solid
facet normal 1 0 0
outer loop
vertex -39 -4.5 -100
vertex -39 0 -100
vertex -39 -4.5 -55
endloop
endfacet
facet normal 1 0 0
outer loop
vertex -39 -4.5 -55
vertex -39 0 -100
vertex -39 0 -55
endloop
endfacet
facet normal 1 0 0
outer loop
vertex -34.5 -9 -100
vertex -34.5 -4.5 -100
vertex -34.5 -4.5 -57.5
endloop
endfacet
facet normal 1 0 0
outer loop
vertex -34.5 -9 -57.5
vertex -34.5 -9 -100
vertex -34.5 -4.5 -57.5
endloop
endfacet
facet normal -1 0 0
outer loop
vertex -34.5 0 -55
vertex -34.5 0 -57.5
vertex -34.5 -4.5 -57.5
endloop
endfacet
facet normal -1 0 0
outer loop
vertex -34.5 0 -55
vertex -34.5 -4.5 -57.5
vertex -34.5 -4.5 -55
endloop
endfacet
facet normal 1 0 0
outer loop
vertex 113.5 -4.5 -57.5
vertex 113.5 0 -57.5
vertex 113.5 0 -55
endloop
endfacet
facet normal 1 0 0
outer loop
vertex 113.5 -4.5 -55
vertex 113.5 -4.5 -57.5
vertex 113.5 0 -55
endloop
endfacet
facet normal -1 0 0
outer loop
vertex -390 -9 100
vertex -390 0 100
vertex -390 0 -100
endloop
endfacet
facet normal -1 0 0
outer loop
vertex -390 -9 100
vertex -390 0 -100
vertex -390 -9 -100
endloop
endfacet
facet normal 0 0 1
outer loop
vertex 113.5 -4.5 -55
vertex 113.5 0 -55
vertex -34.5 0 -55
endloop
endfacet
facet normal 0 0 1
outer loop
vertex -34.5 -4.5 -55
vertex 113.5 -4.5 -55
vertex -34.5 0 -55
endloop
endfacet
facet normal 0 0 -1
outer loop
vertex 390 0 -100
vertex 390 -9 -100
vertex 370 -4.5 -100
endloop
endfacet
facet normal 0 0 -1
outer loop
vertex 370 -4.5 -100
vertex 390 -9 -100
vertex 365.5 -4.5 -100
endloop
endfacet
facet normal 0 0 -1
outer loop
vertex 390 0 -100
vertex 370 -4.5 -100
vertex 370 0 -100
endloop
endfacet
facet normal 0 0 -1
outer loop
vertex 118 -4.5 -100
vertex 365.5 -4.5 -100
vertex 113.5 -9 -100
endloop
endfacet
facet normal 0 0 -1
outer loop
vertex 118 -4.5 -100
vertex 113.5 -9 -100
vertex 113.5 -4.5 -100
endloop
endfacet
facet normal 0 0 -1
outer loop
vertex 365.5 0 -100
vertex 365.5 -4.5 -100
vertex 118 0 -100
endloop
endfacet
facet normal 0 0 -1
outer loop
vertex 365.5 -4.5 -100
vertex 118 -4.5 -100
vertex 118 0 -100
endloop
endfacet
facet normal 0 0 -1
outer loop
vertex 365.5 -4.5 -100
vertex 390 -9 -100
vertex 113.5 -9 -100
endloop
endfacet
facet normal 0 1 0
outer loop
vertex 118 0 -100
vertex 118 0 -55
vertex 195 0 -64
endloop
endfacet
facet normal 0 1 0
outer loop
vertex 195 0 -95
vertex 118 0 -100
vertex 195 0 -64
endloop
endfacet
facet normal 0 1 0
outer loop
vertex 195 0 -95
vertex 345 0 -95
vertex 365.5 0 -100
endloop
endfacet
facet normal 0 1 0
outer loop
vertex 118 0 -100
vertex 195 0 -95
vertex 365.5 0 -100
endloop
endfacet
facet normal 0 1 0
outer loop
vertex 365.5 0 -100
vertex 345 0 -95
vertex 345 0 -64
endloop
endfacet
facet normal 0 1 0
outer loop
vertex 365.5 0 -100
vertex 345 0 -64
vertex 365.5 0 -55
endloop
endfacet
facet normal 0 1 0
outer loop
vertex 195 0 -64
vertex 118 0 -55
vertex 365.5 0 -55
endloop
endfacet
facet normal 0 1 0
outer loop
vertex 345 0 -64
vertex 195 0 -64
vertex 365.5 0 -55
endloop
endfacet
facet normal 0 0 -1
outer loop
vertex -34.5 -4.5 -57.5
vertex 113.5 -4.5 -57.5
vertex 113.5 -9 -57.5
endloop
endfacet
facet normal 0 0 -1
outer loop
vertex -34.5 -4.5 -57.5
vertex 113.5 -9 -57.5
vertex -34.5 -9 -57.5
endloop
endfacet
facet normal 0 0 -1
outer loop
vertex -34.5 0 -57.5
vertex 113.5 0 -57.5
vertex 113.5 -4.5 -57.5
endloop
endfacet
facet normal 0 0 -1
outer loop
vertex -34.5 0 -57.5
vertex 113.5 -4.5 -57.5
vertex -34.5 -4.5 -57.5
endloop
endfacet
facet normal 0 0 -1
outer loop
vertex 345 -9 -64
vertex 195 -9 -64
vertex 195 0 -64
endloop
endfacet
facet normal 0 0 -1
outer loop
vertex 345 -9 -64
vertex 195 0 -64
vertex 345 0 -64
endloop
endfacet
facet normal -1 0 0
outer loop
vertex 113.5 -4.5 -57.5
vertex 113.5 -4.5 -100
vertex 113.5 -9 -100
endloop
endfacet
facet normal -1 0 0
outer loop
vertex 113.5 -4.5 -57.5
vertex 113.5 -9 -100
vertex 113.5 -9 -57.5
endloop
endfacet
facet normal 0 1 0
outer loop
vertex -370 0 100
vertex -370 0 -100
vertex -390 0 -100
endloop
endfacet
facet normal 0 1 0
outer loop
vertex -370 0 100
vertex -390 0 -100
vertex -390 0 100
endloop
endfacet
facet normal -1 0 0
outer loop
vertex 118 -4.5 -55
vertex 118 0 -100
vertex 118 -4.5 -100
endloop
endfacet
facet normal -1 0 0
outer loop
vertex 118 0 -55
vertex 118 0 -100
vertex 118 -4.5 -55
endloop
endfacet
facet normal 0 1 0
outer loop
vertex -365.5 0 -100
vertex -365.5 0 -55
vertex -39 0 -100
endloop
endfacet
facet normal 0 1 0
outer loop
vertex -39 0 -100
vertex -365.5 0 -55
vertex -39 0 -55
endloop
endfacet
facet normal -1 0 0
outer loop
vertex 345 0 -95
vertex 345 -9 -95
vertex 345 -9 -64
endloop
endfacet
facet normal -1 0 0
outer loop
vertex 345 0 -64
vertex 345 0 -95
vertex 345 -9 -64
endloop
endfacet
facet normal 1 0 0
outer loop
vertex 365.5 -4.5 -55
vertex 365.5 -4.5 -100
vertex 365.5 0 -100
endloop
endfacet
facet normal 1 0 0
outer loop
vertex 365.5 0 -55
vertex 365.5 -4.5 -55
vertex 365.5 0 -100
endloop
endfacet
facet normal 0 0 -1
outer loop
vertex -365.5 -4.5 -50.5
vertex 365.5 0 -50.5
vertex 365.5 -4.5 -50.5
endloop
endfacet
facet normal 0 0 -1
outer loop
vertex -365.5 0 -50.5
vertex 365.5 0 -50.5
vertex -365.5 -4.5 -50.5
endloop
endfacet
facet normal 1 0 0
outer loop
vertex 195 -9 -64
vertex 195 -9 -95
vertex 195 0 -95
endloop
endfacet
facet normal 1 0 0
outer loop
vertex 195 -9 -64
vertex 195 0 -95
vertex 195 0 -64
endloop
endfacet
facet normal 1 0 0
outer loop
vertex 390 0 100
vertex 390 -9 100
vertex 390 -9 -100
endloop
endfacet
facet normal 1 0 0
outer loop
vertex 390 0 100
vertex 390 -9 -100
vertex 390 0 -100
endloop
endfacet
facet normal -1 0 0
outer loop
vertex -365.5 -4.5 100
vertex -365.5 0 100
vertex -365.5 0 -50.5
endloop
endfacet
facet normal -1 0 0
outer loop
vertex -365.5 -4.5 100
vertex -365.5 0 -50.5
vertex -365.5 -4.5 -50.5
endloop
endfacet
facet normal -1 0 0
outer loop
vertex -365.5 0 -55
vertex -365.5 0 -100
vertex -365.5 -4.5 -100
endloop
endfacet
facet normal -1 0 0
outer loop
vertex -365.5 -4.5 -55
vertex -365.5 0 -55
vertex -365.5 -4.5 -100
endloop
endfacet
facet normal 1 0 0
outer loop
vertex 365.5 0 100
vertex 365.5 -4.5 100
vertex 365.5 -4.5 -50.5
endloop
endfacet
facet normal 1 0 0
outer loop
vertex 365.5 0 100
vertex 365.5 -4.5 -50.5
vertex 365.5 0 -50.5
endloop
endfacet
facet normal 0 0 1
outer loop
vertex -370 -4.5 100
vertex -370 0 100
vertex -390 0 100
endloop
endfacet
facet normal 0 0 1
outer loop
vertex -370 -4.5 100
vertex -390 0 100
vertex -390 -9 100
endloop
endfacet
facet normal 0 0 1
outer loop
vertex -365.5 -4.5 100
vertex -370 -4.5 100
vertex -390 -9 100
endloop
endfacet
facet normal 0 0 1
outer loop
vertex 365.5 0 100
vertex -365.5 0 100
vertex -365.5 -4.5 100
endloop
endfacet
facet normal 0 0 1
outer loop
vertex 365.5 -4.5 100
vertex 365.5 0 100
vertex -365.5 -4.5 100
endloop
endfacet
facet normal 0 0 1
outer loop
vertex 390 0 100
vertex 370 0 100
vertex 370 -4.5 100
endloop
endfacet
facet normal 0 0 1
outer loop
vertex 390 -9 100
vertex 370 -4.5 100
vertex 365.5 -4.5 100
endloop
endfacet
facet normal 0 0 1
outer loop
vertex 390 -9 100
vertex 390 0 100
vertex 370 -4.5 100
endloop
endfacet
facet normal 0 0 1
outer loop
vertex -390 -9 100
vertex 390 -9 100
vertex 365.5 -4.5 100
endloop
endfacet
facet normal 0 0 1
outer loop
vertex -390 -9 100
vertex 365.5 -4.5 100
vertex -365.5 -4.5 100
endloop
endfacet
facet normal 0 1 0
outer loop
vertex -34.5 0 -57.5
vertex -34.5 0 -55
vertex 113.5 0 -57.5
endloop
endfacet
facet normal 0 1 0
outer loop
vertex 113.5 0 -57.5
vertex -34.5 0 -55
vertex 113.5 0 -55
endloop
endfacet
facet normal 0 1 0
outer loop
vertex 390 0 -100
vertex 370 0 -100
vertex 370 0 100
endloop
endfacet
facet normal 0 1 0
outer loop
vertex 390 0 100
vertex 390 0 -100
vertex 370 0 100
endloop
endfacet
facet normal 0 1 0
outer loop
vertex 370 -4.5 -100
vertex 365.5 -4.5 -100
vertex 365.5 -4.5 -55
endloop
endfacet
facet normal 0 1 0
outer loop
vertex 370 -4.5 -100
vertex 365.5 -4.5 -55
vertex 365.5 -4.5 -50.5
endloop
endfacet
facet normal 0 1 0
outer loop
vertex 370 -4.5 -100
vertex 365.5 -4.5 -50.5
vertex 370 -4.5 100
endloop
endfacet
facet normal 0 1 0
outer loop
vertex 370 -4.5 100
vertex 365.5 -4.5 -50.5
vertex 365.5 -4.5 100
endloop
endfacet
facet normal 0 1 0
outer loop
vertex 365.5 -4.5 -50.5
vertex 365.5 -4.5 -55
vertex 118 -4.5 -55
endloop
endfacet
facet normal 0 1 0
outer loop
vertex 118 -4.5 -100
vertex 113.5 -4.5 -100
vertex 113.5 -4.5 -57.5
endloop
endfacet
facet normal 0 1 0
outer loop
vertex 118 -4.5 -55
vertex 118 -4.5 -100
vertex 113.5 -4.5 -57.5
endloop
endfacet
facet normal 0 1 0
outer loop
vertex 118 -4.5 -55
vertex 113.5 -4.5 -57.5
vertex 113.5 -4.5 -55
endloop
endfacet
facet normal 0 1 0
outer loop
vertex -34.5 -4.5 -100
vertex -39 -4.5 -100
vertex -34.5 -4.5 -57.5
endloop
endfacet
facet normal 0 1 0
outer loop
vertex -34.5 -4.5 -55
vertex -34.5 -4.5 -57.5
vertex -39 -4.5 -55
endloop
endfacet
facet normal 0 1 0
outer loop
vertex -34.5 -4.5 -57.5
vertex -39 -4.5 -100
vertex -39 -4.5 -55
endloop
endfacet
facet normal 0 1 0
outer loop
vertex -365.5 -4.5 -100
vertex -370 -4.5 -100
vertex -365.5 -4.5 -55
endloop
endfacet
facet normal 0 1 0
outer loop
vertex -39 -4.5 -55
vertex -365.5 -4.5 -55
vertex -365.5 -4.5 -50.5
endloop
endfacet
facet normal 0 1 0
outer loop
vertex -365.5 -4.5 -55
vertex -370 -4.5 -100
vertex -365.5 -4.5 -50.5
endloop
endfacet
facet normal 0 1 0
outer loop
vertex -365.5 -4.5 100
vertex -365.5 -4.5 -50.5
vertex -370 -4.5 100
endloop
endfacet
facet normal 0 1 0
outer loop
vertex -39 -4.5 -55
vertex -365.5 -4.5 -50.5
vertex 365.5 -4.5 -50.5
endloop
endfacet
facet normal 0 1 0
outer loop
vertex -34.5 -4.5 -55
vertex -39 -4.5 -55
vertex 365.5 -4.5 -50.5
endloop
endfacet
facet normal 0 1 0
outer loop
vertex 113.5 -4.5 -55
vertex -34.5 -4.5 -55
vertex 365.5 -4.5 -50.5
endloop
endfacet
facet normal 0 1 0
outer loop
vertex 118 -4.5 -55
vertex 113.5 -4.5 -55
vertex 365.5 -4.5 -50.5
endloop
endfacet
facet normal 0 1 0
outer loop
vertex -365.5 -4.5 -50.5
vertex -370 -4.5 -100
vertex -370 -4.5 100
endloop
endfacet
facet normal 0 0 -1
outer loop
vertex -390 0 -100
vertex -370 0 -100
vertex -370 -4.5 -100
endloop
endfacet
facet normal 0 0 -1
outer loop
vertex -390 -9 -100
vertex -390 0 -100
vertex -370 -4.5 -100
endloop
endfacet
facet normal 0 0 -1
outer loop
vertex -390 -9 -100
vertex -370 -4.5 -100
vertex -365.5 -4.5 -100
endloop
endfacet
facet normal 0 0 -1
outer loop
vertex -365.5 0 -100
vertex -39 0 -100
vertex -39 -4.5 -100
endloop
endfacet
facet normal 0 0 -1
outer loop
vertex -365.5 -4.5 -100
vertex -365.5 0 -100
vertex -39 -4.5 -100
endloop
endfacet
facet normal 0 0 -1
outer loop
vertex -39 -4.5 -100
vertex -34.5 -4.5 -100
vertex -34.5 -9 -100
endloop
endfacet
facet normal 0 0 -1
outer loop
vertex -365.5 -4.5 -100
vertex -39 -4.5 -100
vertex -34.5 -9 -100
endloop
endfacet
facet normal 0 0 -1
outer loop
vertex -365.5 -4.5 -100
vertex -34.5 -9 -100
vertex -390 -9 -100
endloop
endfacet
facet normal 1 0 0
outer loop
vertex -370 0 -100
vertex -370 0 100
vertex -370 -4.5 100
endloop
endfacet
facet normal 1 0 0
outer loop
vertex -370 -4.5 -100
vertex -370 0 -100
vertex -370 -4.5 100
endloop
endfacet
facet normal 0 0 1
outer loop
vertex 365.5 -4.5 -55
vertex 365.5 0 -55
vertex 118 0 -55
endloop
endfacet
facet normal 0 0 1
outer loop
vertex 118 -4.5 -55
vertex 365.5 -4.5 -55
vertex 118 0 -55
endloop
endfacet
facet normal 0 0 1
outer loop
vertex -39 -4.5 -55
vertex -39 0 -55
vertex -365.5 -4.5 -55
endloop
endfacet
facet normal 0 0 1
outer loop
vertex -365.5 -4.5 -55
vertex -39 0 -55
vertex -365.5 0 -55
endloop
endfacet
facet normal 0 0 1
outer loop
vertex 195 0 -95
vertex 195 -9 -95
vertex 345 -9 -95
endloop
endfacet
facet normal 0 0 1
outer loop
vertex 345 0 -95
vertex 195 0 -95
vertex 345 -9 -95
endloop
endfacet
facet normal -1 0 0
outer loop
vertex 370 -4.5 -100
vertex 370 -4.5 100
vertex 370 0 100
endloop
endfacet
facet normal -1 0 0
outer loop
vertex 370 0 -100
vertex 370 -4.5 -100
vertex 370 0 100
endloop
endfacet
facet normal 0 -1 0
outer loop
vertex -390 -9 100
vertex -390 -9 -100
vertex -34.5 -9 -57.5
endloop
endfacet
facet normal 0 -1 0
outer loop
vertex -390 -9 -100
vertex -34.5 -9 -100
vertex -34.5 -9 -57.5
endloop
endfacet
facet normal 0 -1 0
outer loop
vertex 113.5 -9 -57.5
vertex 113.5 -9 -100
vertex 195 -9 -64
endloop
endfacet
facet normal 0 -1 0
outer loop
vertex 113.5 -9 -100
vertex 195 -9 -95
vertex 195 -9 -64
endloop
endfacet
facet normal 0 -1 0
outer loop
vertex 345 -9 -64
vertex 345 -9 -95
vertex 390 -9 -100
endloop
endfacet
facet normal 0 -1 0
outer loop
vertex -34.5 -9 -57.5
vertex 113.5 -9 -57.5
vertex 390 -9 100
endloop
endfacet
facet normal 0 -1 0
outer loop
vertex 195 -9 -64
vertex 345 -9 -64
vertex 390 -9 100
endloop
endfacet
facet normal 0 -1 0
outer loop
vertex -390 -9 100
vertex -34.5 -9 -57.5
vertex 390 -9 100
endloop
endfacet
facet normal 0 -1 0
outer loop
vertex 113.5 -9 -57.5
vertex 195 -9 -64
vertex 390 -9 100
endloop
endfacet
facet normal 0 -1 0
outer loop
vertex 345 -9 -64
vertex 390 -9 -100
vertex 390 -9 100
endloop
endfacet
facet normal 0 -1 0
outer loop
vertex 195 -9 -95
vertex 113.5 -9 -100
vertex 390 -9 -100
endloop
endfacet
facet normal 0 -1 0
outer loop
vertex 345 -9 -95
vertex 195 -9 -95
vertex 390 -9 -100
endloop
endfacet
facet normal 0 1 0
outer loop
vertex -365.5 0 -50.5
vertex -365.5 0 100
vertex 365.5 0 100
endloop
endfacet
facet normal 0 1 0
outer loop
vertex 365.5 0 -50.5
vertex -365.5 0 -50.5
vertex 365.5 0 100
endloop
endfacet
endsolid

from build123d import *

# Parameters (mm, degrees)
F0_W      = 740
F0_H      = 200
F1_DEPTH  = 9
F2_W      = 4.5
F2_H      = 200
F3_DEPTH  = 4.5
F4_W      = 4.5
F4_H      = 200
F5_DEPTH  = 4.5
F6_W      = 731
F6_H      = 4.5
F7_DEPTH  = 4.5
F8_W      = 150
F8_H      = 31
F9_DEPTH  = 9
F10_W     = 148
F10_H     = 42.5
F11_DEPTH = 9.001
F12_W     = 4.5
F12_H     = 45
F13_DEPTH = 4.5
F14_W     = 9
F14_H     = 200
F15_DEPTH = 20
F16_W     = 9
F16_H     = 200
F17_DEPTH = 20


with BuildPart() as f1:
    # F0 (on Front) → F1 (new body)
    with BuildSketch(Plane.XZ):
        Rectangle(F0_W, F0_H)
    extrude(amount=F1_DEPTH)

    # F2 (on face) → F3 (cut)
    with BuildSketch(Plane.YZ.offset(370)):
        with Locations((-2.25, 0)):
            Rectangle(F2_W, F2_H)
    extrude(amount=-F3_DEPTH, mode=Mode.SUBTRACT)

    # F4 (on face) → F5 (cut)
    with BuildSketch(Plane(origin=(-370, 0, 0), x_dir=(0, -1, 0), z_dir=(-1, 0, 0))):
        with Locations((2.25, 0)):
            Rectangle(F4_W, F4_H)
    extrude(amount=-F5_DEPTH, mode=Mode.SUBTRACT)

    # F6 (on face) → F7 (cut)
    with BuildSketch(Plane(origin=(0, 0, 0), x_dir=(-1, 0, 0), z_dir=(0, 1, 0))):
        with Locations((0, -52.75)):
            Rectangle(F6_W, F6_H)
    extrude(amount=-F7_DEPTH, mode=Mode.SUBTRACT)

    # F8 (on face) → F9 (cut, through all)
    with BuildSketch(Plane.XZ.offset(9)):
        with Locations((270, -79.5)):
            Rectangle(F8_W, F8_H)
    extrude(amount=-F9_DEPTH, mode=Mode.SUBTRACT)

    # F10 (on face) → F11 (cut, through all)
    with BuildSketch(Plane(origin=(0, 0, 0), x_dir=(-1, 0, 0), z_dir=(0, 1, 0))):
        with Locations((-39.5, -78.75)):
            Rectangle(F10_W, F10_H)
    extrude(amount=-F11_DEPTH, mode=Mode.SUBTRACT)

    # F12 (on face) → F13 (cut)
    with BuildSketch(Plane(origin=(0, 0, 0), x_dir=(-1, 0, 0), z_dir=(0, 1, 0))):
        with Locations((36.75, -77.5)):
            Rectangle(F12_W, F12_H)
        with Locations((-115.75, -77.5)):
            Rectangle(F12_W, F12_H)
    extrude(amount=-F13_DEPTH, mode=Mode.SUBTRACT)

    # F14 (on face) → F15 (join)
    with BuildSketch(Plane.YZ.offset(370)):
        with Locations((-4.5, 0)):
            Rectangle(F14_W, F14_H)
    extrude(amount=F15_DEPTH)

    # F16 (on face) → F17 (join)
    with BuildSketch(Plane(origin=(-370, 0, 0), x_dir=(0, -1, 0), z_dir=(-1, 0, 0))):
        with Locations((4.5, 0)):
            Rectangle(F16_W, F16_H)
    extrude(amount=F17_DEPTH)


solid = f1.part
